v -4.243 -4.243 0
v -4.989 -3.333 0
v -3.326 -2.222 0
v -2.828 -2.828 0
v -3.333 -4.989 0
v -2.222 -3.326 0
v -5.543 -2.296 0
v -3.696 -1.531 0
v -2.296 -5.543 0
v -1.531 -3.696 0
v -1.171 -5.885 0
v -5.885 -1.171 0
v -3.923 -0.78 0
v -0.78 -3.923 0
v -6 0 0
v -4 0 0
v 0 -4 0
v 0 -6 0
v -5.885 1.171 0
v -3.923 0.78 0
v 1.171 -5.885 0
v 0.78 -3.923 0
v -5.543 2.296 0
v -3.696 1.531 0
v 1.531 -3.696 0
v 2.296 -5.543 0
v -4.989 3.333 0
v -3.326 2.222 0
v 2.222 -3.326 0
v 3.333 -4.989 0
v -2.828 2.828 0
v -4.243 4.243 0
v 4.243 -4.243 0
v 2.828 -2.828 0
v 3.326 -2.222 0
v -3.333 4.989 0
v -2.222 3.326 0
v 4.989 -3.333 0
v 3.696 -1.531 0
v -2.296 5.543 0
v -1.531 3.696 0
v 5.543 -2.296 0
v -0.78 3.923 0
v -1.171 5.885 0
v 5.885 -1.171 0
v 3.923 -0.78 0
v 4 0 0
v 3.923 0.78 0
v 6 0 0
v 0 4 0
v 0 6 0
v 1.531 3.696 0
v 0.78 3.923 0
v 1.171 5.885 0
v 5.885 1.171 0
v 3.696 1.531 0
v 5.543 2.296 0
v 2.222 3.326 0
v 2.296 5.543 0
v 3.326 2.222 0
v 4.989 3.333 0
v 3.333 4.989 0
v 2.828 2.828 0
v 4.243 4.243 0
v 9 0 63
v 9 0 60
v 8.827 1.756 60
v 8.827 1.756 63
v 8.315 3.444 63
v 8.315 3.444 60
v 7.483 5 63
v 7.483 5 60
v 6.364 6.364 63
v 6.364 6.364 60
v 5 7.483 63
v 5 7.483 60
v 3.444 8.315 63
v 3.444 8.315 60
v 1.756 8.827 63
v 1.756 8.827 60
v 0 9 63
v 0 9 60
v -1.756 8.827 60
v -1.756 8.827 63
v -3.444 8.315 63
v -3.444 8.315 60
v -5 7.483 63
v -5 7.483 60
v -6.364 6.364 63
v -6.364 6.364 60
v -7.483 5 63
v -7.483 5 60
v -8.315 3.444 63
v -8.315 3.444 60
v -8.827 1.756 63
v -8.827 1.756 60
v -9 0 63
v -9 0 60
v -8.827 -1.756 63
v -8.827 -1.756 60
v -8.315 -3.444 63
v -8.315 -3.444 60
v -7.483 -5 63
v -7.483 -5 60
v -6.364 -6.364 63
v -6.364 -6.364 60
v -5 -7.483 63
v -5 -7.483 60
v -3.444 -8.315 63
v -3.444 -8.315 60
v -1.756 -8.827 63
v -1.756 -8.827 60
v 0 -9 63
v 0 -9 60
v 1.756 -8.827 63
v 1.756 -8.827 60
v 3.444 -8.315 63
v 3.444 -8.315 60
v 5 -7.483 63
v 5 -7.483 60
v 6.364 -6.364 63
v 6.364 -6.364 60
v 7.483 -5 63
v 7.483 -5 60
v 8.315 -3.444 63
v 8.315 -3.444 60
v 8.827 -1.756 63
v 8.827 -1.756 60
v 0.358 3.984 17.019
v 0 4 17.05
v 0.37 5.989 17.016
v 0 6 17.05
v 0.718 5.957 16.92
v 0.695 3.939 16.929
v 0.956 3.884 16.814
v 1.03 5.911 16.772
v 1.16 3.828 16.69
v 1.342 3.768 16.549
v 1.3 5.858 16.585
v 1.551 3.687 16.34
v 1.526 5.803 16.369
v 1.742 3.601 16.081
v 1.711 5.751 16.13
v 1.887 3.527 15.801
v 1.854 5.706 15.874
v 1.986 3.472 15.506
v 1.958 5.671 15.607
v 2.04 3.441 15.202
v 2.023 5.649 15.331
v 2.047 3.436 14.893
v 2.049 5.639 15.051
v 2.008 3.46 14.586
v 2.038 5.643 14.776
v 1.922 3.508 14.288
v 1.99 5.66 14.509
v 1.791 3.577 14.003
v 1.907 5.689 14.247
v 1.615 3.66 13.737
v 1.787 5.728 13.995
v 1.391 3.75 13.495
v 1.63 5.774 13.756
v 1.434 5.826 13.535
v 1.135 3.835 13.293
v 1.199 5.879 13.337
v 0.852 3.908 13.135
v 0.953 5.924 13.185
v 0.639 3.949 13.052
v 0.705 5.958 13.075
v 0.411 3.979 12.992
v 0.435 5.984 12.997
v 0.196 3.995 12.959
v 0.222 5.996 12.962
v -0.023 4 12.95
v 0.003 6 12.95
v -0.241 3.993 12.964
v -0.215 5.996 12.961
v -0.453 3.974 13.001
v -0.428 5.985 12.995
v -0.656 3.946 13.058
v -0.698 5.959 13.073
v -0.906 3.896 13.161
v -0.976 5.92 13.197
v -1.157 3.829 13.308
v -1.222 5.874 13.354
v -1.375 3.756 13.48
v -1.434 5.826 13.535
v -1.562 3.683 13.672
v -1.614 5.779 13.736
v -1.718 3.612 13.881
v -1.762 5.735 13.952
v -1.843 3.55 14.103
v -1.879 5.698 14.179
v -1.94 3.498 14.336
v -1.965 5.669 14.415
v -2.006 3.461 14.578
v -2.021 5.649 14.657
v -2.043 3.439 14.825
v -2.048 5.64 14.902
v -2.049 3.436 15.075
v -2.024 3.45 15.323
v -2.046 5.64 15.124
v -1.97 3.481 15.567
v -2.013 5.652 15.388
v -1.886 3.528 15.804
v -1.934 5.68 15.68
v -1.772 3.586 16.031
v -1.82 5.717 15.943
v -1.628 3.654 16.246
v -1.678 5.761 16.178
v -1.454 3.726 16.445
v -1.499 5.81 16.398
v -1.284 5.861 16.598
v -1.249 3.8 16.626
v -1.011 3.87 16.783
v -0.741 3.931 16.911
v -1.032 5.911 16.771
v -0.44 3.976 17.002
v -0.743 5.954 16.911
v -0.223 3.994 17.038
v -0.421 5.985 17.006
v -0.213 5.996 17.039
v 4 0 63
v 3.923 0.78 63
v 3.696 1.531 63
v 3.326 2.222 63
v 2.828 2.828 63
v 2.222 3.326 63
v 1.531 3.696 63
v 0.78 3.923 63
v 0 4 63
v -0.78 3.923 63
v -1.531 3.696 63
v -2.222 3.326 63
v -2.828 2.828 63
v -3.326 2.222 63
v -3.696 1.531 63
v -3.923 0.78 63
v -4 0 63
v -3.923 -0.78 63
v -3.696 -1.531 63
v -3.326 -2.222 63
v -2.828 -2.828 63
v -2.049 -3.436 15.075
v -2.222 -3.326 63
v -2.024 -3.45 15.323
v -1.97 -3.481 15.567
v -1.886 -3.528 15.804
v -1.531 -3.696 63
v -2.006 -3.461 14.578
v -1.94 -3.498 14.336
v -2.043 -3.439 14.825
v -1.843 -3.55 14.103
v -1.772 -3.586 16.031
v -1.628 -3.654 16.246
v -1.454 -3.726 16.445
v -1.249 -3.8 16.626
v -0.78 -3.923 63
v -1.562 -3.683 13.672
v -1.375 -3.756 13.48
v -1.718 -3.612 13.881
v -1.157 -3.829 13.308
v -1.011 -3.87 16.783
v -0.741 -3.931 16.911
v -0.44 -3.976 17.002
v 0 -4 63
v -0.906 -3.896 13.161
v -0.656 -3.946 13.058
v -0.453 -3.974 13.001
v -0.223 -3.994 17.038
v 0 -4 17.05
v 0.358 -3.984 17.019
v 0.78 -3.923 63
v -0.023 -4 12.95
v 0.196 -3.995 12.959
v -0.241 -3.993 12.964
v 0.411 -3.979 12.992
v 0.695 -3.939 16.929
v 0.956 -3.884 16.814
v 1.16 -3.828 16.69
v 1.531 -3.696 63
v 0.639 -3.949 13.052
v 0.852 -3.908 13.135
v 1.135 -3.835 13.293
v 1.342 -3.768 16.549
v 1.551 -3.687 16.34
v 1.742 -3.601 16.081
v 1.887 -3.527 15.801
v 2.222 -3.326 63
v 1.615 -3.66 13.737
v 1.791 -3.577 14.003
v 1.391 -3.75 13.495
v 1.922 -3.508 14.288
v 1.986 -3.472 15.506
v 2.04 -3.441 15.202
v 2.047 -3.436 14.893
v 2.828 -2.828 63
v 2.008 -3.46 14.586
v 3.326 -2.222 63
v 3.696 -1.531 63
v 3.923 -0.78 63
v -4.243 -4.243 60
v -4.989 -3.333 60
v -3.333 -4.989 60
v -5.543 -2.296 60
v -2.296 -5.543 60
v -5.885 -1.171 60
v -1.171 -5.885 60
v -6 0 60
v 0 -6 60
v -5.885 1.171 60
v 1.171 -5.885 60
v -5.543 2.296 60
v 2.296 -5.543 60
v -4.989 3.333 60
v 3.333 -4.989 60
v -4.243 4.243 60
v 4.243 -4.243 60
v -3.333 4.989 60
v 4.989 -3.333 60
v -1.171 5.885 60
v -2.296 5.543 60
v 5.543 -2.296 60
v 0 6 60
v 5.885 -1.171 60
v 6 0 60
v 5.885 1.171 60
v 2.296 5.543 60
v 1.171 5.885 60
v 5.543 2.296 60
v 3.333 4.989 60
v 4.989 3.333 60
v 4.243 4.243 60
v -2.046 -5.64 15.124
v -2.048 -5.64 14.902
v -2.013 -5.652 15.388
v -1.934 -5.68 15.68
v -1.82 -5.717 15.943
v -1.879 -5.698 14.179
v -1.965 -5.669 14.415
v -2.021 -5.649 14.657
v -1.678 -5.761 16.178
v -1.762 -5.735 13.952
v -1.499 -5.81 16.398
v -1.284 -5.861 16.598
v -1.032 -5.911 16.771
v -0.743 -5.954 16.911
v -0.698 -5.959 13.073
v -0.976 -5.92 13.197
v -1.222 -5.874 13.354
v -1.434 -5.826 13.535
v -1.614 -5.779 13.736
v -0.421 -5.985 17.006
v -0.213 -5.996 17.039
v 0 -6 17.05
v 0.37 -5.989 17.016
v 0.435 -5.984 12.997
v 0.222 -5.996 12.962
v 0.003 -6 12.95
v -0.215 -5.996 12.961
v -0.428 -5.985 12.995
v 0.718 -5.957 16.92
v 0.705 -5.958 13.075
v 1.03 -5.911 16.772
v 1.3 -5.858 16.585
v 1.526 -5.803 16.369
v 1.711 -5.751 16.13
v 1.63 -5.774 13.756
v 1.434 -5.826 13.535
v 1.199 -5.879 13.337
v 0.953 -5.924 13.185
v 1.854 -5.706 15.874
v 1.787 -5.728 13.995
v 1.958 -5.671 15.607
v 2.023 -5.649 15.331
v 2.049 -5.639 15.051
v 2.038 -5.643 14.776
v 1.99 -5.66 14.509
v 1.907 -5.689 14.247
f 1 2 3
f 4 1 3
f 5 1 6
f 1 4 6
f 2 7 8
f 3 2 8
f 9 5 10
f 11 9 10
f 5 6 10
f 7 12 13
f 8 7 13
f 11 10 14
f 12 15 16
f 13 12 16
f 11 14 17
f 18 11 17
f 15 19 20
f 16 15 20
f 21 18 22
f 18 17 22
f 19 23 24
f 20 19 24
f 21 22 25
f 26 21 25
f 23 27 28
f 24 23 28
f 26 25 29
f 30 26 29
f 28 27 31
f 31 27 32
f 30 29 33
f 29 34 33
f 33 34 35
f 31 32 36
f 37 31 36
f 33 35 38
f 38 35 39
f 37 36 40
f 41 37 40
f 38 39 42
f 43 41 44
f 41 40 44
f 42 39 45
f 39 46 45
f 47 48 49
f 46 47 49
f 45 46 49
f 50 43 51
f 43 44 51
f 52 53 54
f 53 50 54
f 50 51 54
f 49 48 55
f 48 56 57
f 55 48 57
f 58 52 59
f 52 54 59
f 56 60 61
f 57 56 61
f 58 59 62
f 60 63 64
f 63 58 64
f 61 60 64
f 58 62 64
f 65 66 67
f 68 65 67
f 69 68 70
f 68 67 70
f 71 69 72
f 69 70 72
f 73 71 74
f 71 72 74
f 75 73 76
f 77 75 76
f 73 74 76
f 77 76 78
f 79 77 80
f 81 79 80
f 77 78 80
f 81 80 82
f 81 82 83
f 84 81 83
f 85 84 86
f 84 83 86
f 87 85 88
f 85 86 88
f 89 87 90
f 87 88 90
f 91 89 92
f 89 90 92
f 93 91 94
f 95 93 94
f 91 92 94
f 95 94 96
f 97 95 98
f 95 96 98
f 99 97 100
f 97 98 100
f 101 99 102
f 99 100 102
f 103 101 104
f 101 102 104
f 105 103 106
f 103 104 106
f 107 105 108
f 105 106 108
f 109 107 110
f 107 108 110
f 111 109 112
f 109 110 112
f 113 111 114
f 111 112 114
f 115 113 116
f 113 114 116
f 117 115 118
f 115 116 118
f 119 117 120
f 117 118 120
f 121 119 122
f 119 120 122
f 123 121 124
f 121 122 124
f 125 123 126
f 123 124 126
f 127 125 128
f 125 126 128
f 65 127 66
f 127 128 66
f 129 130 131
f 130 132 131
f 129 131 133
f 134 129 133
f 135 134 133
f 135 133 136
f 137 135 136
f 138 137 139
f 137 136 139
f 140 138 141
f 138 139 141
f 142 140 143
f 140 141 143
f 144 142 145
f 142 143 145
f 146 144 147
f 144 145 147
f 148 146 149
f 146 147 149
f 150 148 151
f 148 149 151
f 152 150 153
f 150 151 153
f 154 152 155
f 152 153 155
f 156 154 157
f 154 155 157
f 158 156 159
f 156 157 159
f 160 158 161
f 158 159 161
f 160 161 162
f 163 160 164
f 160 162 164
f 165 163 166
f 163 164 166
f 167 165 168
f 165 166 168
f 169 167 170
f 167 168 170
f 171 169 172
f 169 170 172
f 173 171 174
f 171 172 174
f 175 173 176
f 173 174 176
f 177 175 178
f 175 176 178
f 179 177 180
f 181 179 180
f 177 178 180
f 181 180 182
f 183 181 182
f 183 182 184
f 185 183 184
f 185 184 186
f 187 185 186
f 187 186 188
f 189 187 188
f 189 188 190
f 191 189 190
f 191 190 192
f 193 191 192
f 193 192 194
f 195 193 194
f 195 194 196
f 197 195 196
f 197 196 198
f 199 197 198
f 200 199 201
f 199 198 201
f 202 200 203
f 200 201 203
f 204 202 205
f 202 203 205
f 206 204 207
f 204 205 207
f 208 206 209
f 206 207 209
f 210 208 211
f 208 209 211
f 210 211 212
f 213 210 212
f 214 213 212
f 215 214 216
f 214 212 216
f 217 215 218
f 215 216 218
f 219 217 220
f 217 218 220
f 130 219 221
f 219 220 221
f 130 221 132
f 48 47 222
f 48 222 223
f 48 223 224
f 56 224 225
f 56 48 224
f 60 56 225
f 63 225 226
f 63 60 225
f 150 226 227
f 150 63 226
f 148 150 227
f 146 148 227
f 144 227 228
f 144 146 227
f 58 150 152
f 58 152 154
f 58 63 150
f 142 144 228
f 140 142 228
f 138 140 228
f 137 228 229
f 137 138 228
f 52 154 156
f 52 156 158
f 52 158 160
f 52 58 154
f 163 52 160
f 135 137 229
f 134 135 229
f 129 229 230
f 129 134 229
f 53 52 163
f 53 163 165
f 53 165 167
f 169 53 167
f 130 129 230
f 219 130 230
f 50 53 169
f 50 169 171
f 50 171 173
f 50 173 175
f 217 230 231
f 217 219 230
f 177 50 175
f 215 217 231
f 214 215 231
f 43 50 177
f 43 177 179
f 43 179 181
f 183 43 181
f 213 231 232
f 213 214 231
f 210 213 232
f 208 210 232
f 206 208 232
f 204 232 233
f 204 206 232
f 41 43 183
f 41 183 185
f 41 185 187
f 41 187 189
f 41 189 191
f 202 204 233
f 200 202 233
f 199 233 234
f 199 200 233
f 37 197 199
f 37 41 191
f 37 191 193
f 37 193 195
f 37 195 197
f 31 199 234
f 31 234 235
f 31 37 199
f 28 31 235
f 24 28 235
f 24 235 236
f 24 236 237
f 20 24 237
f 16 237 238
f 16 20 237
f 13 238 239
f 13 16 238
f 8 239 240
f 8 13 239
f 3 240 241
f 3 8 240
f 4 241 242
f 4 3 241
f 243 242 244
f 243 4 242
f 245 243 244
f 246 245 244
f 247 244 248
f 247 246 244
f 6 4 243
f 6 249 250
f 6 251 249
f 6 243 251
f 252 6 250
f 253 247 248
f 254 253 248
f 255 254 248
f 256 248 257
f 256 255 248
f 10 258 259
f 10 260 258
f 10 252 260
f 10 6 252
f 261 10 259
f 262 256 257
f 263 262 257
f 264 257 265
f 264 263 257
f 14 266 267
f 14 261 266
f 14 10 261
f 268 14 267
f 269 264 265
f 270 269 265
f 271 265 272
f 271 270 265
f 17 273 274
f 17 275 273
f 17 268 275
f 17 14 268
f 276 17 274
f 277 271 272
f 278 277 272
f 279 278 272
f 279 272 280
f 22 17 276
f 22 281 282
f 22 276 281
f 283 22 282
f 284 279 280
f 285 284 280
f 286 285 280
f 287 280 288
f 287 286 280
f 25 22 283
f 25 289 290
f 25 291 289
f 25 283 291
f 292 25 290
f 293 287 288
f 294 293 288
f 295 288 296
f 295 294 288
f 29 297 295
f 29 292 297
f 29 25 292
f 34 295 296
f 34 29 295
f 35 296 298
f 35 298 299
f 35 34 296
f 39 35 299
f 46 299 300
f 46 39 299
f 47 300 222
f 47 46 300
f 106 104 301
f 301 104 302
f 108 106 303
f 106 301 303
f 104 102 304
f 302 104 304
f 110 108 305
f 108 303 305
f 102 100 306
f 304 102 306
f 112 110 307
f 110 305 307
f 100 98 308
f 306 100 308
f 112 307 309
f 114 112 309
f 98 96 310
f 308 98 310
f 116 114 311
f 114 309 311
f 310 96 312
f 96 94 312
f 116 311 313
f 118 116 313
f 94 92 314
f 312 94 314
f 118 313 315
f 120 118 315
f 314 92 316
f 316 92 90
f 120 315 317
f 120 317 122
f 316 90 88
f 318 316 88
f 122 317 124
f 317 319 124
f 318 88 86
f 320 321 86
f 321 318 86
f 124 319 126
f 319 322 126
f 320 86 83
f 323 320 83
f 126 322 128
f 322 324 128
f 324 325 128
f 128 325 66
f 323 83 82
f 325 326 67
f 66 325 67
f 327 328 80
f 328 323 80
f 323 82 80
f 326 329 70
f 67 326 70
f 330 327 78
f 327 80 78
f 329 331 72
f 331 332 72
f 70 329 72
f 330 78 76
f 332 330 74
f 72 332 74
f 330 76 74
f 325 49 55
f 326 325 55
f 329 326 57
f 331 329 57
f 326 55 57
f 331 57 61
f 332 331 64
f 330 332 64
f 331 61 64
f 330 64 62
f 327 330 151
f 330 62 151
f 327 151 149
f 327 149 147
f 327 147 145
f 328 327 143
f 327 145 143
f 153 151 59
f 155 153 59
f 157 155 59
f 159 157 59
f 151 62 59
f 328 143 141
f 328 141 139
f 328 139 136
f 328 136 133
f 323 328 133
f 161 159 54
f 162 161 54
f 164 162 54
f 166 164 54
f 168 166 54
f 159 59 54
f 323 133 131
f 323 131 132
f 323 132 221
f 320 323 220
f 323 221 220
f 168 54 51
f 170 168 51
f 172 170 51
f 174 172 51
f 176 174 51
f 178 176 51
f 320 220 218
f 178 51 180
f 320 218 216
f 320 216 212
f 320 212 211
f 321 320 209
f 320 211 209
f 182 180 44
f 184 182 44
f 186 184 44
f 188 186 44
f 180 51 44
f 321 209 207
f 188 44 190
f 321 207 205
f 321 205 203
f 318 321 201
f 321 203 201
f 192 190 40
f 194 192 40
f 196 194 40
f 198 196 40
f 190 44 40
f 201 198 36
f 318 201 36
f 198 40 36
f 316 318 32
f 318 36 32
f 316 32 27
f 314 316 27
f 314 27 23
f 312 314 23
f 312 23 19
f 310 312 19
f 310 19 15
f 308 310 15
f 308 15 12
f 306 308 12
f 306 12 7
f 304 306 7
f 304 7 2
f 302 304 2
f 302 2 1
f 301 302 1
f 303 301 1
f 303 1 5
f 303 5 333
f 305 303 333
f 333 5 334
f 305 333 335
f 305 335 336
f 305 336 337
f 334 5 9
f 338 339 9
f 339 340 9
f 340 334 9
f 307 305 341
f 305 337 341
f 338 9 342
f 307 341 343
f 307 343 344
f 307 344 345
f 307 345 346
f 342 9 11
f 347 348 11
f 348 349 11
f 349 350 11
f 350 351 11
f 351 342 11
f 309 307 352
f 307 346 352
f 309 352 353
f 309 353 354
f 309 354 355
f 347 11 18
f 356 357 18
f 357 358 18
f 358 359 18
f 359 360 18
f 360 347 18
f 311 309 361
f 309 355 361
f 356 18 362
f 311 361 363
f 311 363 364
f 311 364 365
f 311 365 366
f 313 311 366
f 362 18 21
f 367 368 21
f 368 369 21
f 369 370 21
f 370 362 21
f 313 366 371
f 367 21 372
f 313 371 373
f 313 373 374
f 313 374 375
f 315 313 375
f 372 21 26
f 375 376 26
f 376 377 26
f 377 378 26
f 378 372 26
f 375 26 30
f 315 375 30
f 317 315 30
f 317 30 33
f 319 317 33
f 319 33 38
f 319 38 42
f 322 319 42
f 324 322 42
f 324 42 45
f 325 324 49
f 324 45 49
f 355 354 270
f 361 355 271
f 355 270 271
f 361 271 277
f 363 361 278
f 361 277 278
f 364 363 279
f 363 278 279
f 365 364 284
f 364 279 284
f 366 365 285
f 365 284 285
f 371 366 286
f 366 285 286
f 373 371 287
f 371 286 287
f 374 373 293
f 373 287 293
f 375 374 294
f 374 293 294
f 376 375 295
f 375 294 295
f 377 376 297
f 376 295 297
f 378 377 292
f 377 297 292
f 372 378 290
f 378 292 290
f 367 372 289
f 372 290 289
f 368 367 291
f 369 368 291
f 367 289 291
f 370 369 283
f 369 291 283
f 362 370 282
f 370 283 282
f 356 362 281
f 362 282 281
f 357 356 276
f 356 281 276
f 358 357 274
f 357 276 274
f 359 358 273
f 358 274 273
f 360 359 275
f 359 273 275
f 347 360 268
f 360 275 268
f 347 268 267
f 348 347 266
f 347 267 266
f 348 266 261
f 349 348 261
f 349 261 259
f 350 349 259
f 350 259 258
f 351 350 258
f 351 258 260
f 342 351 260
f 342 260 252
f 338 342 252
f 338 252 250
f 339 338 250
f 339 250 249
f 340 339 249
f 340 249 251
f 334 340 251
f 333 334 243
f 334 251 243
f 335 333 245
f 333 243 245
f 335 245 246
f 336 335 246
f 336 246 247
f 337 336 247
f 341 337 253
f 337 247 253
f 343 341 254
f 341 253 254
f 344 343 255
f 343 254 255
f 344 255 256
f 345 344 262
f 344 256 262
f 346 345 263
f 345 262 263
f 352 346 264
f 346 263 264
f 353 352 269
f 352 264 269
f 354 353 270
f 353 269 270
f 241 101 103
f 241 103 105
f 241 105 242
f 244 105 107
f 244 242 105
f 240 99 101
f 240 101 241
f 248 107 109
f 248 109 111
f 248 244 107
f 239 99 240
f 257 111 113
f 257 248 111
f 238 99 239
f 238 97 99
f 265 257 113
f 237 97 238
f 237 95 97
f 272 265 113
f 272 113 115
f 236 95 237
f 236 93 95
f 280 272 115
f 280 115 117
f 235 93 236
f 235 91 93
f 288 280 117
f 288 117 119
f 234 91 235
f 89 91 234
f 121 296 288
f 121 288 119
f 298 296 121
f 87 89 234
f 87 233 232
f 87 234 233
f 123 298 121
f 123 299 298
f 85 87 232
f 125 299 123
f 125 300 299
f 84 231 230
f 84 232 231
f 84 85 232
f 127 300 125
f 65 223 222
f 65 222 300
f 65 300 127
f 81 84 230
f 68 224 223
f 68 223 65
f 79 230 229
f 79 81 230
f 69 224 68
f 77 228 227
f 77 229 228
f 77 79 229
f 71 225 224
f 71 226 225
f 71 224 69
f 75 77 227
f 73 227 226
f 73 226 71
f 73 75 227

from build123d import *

# Parameters (mm, degrees)
SKETCH_1_R          = 6
SKETCH_1_R_2        = 4
EXTRUDE_1_DEPTH     = 60
SKETCH_2_R          = 9
SKETCH_2_R_2        = 4
EXTRUDE_2_DEPTH     = 3
SKETCH_3_R          = 2.05
CUT_EXTRUDE_1_DEPTH = 25


with BuildPart() as part:
    # 草图1 → 凸台-拉伸1 (new body)
    with BuildSketch(Plane.XY):
        Circle(SKETCH_1_R)
        Circle(SKETCH_1_R_2, mode=Mode.SUBTRACT)
    extrude(amount=EXTRUDE_1_DEPTH)

    # 草图2 → 凸台-拉伸2 (add)
    with BuildSketch(Plane.XY.offset(60)):
        Circle(SKETCH_2_R)
        Circle(SKETCH_2_R_2, mode=Mode.SUBTRACT)
    extrude(amount=EXTRUDE_2_DEPTH)

    # 草图3 → 切除-拉伸1 (cut, symmetric)
    with BuildSketch(Plane(origin=(0, 0, 0), x_dir=(1, 0, 0), z_dir=(0, 1, 0))):
        with Locations(Location((0, -15, 0), (0, 0, 270))):
            Circle(SKETCH_3_R)
    extrude(amount=CUT_EXTRUDE_1_DEPTH, both=True, mode=Mode.SUBTRACT)


solid = part.part
